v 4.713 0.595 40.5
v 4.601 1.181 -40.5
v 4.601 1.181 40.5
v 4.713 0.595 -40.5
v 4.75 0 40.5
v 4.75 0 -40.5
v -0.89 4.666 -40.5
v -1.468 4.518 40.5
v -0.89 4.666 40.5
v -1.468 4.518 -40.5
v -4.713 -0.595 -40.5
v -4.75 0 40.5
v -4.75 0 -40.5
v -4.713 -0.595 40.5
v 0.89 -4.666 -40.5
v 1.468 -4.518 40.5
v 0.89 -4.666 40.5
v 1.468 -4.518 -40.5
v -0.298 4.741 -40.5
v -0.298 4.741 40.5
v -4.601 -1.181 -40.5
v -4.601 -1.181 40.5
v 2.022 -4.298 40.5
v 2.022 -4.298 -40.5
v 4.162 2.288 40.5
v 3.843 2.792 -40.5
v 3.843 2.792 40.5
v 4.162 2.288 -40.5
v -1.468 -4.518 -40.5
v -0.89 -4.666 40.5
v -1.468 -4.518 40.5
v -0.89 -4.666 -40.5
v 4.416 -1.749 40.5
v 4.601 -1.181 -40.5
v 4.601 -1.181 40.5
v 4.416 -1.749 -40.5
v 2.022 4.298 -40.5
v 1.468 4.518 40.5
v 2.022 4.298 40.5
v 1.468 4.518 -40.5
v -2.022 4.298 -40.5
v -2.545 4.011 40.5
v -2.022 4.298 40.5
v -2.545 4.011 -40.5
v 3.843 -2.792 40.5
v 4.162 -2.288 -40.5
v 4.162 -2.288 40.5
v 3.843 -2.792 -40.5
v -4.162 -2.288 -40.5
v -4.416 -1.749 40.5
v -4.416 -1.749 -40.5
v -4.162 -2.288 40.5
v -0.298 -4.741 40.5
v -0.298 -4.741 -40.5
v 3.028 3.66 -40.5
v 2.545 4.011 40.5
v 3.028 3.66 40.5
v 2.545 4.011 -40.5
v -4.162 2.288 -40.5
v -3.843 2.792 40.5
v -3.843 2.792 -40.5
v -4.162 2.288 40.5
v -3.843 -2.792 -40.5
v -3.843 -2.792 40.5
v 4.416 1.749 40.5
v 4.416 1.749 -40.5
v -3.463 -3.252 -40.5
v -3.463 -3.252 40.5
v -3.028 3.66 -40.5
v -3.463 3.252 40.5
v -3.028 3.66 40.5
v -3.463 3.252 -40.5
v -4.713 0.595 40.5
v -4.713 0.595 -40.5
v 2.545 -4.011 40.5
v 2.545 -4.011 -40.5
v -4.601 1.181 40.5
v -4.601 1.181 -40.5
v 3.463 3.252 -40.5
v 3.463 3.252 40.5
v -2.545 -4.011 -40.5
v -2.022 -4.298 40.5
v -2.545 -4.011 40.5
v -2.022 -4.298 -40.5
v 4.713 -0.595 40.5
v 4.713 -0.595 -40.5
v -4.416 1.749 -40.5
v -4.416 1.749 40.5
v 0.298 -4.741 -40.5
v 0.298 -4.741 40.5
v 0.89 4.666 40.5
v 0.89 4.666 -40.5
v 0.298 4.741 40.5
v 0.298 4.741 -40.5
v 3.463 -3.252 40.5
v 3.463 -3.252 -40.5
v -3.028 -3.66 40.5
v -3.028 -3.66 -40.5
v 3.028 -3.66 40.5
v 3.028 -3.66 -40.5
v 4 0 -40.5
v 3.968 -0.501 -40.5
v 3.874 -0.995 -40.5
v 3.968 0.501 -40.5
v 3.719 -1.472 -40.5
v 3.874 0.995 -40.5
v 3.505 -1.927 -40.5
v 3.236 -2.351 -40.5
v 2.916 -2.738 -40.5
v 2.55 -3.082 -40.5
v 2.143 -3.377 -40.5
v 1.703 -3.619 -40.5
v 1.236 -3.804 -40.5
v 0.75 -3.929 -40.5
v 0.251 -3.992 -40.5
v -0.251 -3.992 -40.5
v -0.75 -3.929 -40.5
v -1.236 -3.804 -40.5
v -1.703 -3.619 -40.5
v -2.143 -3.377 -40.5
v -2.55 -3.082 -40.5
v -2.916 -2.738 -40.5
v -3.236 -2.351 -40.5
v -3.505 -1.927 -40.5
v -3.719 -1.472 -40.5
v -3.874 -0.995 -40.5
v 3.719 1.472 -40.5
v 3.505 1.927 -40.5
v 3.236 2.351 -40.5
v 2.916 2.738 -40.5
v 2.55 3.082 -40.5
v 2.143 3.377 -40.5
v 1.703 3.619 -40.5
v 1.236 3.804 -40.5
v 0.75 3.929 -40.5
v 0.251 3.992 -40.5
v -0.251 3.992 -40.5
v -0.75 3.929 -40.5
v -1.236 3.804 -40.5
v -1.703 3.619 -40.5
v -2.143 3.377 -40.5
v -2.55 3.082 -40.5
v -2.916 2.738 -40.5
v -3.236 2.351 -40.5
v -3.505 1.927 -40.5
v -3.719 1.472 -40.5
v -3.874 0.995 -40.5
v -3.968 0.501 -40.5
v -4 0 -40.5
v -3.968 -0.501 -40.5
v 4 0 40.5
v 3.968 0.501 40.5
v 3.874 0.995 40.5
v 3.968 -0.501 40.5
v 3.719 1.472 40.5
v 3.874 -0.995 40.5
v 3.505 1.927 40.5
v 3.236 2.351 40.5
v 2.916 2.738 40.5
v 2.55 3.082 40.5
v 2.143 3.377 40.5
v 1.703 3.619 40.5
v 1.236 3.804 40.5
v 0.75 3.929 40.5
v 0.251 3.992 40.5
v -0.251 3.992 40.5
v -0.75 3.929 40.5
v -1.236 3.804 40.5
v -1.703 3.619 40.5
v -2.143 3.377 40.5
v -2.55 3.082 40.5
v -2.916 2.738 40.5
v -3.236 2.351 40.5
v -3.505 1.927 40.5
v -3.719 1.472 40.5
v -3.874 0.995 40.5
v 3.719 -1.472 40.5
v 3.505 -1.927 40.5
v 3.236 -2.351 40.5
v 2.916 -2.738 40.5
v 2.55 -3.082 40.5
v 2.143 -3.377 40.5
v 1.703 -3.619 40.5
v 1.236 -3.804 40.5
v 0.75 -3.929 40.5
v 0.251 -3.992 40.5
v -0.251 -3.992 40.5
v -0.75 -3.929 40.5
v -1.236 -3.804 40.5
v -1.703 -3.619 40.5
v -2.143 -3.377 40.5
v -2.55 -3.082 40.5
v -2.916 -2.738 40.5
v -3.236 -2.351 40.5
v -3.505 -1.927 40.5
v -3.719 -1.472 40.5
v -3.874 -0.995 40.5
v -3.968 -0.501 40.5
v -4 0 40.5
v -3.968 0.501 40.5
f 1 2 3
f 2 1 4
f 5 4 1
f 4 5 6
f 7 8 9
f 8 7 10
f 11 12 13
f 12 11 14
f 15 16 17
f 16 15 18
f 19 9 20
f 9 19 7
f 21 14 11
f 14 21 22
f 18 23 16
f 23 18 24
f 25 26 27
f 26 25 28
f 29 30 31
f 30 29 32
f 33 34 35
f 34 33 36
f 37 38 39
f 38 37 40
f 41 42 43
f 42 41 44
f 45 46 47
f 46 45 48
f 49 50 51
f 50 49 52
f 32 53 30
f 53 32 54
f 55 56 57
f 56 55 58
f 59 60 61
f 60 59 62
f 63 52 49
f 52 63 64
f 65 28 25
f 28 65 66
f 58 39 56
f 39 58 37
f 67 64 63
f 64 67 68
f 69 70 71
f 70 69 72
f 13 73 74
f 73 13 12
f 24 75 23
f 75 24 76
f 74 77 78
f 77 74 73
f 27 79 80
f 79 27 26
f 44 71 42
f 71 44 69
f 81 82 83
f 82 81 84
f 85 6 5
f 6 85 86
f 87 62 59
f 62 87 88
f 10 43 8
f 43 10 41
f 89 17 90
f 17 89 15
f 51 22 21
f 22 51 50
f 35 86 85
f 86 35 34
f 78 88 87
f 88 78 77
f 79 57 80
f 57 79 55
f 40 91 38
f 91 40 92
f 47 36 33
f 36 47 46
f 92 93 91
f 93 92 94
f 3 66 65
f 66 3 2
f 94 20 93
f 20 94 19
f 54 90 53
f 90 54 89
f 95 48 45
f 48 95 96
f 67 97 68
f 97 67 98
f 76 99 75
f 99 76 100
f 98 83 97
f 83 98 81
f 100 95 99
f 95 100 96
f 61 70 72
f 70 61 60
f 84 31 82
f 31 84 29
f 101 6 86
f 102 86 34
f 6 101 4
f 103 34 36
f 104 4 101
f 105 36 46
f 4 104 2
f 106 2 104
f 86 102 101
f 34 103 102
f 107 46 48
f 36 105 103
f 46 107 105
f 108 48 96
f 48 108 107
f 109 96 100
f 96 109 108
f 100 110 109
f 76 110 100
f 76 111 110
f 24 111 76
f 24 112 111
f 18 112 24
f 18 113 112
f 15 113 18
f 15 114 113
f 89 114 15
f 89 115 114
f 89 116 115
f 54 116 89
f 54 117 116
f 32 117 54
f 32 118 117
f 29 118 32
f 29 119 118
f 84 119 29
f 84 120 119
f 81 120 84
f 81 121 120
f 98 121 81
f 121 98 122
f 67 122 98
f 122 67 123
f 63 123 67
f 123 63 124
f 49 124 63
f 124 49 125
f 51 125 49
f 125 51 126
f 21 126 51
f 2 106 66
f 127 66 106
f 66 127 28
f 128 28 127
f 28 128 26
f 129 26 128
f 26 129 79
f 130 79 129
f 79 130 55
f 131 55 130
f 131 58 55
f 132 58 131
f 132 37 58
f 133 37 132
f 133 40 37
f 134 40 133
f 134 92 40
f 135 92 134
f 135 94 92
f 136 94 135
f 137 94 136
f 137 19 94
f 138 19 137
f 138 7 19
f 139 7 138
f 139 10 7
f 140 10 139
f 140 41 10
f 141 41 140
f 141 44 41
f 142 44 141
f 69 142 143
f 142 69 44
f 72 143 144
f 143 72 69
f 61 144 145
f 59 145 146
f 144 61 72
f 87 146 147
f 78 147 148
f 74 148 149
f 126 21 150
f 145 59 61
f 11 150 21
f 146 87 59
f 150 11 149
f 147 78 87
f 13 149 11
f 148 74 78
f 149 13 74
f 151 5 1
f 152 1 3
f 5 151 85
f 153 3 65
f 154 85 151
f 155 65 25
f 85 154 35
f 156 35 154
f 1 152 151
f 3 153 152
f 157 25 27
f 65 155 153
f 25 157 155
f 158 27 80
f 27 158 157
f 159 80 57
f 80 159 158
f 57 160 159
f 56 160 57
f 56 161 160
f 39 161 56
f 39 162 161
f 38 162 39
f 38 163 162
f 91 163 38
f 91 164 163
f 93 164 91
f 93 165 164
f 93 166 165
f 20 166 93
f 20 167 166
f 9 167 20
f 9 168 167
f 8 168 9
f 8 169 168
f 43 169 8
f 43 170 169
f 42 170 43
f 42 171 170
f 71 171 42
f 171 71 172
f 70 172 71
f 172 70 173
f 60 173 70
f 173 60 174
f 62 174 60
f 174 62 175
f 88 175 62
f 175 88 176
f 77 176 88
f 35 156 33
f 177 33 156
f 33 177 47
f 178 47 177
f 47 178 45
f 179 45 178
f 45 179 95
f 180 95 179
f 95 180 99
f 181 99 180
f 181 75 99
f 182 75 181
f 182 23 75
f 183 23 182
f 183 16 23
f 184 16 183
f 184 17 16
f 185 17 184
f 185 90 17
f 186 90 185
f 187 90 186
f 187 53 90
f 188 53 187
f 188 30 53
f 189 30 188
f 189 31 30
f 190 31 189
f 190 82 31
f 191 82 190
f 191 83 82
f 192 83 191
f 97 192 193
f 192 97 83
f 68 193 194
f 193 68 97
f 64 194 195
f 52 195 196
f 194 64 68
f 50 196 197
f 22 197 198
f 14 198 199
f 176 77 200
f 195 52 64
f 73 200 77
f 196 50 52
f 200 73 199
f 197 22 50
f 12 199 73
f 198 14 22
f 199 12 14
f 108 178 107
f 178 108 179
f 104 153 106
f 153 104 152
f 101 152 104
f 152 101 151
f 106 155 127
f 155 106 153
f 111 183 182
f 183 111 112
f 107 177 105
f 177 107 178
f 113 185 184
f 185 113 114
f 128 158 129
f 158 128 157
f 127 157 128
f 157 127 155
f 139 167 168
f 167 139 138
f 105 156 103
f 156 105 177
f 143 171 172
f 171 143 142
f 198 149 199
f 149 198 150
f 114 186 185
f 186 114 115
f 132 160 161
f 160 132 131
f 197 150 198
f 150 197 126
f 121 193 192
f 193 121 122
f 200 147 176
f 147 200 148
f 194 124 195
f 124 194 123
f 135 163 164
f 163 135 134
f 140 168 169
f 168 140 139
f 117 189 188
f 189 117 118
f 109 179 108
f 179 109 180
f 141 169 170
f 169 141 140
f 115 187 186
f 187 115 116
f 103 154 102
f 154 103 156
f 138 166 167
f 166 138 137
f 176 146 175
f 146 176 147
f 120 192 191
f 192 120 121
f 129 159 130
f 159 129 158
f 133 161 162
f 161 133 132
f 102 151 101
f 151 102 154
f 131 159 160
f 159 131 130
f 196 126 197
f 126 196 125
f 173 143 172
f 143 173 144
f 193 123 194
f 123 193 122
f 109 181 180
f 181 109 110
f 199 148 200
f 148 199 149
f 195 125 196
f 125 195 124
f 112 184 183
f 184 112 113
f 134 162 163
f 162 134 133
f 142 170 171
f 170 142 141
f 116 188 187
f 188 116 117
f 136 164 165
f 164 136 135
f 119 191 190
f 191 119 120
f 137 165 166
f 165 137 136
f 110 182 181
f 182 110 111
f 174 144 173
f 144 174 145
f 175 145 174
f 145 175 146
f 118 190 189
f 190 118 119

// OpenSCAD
$fn = 50;


difference() {
	union() {
		translate(v = [0, 0, -40.5000000000]) {
			cylinder(h = 81, r = 4.7500000000);
		}
	}
	union() {
		translate(v = [0, 0, -100.0000000000]) {
			cylinder(h = 200, r = 4.0000000000);
		}
	}
}
